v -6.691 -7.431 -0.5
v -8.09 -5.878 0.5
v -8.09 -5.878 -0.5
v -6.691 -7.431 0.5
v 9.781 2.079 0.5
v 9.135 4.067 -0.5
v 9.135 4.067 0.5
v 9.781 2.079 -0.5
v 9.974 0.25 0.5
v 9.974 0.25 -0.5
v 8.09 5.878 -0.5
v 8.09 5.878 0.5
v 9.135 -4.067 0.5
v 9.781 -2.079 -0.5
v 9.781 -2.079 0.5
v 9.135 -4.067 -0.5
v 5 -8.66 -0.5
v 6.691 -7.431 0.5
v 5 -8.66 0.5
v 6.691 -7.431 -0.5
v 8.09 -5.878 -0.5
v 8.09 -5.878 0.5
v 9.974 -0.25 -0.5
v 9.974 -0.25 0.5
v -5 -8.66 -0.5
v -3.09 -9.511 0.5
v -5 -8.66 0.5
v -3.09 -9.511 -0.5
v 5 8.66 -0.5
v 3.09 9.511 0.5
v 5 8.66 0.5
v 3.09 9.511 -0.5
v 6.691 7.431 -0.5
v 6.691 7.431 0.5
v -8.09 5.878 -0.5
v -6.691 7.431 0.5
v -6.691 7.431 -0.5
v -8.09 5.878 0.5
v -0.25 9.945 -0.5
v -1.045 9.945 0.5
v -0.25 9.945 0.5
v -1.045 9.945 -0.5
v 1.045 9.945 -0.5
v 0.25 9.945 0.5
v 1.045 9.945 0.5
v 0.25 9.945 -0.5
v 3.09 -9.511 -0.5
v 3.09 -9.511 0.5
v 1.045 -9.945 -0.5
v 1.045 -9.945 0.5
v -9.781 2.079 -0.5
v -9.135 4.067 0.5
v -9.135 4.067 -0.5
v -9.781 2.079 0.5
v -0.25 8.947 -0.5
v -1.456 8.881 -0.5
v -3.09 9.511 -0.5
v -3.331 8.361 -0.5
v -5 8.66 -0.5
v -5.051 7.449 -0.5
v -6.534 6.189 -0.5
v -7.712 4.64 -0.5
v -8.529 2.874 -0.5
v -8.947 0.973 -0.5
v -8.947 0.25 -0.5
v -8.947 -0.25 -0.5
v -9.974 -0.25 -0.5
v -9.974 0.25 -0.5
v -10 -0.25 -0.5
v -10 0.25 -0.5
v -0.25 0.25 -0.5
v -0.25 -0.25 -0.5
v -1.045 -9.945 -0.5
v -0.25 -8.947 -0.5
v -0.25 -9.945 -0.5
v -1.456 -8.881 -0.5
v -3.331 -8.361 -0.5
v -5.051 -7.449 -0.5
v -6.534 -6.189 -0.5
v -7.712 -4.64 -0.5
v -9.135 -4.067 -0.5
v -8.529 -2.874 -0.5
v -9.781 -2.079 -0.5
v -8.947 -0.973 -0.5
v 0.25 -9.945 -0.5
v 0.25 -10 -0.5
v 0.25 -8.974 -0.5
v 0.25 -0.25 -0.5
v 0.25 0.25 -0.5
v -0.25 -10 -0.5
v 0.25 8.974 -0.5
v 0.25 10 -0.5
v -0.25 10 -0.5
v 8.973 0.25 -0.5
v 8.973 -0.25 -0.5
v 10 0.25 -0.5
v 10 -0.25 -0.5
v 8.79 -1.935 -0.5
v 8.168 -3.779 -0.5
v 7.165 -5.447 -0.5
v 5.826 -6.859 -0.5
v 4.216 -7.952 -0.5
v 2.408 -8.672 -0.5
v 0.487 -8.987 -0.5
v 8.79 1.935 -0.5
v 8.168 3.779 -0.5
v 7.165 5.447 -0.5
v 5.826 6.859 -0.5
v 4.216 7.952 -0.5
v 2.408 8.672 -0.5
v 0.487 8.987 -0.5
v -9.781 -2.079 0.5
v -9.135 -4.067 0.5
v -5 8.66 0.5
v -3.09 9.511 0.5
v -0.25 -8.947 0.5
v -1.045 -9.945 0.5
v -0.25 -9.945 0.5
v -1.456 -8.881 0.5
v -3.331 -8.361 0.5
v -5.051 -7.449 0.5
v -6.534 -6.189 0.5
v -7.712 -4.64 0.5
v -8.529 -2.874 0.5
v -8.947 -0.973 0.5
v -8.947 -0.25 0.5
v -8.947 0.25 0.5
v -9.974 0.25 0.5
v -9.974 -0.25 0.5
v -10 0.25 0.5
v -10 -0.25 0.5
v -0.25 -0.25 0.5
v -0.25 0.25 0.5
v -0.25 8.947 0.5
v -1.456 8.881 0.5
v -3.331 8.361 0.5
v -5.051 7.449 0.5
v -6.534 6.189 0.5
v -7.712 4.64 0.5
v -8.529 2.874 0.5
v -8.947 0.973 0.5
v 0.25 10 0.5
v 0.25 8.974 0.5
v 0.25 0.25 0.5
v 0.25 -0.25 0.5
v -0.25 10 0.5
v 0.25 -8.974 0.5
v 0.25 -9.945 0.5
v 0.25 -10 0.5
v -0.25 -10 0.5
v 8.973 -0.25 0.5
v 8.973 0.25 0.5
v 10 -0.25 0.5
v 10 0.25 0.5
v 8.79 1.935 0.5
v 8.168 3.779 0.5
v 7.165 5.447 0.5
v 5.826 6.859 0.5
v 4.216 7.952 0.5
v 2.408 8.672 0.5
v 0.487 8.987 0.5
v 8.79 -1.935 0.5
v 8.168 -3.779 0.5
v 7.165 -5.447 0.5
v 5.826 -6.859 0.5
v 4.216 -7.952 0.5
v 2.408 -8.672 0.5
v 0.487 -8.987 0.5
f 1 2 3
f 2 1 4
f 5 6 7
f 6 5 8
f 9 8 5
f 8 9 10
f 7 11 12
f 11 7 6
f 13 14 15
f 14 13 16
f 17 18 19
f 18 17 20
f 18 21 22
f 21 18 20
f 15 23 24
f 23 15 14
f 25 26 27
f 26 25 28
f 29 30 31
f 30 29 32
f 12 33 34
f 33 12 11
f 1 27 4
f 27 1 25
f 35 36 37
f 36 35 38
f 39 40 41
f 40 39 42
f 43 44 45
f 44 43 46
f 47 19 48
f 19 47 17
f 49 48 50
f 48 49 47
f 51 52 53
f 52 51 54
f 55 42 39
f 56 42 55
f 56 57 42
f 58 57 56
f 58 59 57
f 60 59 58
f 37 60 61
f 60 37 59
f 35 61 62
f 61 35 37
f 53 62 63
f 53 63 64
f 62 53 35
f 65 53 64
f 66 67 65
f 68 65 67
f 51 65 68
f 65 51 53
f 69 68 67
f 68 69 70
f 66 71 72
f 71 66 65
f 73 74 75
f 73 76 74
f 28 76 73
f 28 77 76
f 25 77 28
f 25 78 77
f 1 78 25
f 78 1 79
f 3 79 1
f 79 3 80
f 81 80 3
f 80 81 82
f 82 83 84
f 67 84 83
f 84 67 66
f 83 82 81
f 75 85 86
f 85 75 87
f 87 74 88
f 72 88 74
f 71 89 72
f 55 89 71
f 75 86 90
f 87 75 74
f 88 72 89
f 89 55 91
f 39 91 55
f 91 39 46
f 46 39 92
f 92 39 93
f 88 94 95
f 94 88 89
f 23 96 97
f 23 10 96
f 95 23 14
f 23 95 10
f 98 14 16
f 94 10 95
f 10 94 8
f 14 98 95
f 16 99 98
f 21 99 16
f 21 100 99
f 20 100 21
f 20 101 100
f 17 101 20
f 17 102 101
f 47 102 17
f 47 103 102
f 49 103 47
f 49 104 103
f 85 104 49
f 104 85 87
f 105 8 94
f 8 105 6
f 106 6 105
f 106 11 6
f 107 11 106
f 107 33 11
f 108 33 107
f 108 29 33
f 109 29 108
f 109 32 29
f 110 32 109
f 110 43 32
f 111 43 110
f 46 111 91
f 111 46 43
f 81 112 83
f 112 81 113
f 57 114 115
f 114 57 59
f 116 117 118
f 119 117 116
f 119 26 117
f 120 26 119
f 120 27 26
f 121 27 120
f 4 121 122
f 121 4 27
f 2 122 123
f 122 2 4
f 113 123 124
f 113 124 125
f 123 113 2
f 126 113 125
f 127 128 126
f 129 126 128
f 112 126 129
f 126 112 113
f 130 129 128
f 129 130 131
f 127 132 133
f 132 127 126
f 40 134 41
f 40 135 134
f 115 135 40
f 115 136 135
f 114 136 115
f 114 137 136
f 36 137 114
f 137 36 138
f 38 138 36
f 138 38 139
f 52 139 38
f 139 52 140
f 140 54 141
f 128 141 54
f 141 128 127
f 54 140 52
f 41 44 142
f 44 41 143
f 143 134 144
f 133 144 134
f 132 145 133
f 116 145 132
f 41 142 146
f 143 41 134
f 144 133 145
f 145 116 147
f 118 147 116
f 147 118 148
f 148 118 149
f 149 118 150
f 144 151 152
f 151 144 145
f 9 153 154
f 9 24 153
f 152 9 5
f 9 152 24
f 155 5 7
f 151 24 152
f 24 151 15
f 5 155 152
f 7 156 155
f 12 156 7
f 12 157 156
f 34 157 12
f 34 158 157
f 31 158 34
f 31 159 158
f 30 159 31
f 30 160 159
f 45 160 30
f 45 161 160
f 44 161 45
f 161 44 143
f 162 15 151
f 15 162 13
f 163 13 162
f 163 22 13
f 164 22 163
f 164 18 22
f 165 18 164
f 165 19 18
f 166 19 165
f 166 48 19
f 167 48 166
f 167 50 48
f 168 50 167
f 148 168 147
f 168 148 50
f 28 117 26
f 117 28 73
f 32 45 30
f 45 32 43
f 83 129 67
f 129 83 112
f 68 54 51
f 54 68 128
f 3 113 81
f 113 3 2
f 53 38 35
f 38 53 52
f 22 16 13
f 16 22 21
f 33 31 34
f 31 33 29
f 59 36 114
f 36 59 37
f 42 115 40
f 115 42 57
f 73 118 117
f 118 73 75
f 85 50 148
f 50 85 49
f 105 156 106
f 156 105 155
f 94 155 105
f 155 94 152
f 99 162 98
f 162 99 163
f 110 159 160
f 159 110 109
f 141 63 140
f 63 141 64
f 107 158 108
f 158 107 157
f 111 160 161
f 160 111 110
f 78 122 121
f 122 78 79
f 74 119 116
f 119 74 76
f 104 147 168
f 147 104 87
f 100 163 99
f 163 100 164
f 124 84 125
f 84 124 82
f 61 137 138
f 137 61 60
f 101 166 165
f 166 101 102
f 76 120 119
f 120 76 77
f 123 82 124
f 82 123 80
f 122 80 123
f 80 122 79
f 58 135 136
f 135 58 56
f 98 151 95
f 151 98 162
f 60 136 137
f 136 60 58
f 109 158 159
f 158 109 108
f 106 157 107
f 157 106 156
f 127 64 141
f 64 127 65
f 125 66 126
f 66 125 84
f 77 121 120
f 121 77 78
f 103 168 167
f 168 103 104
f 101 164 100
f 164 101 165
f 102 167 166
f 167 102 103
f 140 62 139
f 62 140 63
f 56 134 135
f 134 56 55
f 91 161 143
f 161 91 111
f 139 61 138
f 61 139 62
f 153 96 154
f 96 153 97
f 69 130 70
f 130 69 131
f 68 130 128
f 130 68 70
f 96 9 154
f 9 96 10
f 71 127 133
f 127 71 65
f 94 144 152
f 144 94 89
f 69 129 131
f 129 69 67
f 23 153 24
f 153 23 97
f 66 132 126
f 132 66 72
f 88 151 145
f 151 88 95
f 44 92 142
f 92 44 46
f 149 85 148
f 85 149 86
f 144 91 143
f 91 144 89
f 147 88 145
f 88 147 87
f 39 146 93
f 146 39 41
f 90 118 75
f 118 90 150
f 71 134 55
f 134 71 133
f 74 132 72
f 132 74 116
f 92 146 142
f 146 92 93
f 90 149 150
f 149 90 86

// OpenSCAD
// Simple layout to check that print is centered
// Add offset as measured to G code. 
// Example X needs to move 3.8mm to left and Y 5.5 to back:
// M206 X3.8 Y-5.5

difference() {
  cylinder(h=1,r=10,center=true);
  cylinder(h=1,r=9,center=true);
}

cube([20,0.5,1],center=true);
cube([0.5,20,1],center=true);
